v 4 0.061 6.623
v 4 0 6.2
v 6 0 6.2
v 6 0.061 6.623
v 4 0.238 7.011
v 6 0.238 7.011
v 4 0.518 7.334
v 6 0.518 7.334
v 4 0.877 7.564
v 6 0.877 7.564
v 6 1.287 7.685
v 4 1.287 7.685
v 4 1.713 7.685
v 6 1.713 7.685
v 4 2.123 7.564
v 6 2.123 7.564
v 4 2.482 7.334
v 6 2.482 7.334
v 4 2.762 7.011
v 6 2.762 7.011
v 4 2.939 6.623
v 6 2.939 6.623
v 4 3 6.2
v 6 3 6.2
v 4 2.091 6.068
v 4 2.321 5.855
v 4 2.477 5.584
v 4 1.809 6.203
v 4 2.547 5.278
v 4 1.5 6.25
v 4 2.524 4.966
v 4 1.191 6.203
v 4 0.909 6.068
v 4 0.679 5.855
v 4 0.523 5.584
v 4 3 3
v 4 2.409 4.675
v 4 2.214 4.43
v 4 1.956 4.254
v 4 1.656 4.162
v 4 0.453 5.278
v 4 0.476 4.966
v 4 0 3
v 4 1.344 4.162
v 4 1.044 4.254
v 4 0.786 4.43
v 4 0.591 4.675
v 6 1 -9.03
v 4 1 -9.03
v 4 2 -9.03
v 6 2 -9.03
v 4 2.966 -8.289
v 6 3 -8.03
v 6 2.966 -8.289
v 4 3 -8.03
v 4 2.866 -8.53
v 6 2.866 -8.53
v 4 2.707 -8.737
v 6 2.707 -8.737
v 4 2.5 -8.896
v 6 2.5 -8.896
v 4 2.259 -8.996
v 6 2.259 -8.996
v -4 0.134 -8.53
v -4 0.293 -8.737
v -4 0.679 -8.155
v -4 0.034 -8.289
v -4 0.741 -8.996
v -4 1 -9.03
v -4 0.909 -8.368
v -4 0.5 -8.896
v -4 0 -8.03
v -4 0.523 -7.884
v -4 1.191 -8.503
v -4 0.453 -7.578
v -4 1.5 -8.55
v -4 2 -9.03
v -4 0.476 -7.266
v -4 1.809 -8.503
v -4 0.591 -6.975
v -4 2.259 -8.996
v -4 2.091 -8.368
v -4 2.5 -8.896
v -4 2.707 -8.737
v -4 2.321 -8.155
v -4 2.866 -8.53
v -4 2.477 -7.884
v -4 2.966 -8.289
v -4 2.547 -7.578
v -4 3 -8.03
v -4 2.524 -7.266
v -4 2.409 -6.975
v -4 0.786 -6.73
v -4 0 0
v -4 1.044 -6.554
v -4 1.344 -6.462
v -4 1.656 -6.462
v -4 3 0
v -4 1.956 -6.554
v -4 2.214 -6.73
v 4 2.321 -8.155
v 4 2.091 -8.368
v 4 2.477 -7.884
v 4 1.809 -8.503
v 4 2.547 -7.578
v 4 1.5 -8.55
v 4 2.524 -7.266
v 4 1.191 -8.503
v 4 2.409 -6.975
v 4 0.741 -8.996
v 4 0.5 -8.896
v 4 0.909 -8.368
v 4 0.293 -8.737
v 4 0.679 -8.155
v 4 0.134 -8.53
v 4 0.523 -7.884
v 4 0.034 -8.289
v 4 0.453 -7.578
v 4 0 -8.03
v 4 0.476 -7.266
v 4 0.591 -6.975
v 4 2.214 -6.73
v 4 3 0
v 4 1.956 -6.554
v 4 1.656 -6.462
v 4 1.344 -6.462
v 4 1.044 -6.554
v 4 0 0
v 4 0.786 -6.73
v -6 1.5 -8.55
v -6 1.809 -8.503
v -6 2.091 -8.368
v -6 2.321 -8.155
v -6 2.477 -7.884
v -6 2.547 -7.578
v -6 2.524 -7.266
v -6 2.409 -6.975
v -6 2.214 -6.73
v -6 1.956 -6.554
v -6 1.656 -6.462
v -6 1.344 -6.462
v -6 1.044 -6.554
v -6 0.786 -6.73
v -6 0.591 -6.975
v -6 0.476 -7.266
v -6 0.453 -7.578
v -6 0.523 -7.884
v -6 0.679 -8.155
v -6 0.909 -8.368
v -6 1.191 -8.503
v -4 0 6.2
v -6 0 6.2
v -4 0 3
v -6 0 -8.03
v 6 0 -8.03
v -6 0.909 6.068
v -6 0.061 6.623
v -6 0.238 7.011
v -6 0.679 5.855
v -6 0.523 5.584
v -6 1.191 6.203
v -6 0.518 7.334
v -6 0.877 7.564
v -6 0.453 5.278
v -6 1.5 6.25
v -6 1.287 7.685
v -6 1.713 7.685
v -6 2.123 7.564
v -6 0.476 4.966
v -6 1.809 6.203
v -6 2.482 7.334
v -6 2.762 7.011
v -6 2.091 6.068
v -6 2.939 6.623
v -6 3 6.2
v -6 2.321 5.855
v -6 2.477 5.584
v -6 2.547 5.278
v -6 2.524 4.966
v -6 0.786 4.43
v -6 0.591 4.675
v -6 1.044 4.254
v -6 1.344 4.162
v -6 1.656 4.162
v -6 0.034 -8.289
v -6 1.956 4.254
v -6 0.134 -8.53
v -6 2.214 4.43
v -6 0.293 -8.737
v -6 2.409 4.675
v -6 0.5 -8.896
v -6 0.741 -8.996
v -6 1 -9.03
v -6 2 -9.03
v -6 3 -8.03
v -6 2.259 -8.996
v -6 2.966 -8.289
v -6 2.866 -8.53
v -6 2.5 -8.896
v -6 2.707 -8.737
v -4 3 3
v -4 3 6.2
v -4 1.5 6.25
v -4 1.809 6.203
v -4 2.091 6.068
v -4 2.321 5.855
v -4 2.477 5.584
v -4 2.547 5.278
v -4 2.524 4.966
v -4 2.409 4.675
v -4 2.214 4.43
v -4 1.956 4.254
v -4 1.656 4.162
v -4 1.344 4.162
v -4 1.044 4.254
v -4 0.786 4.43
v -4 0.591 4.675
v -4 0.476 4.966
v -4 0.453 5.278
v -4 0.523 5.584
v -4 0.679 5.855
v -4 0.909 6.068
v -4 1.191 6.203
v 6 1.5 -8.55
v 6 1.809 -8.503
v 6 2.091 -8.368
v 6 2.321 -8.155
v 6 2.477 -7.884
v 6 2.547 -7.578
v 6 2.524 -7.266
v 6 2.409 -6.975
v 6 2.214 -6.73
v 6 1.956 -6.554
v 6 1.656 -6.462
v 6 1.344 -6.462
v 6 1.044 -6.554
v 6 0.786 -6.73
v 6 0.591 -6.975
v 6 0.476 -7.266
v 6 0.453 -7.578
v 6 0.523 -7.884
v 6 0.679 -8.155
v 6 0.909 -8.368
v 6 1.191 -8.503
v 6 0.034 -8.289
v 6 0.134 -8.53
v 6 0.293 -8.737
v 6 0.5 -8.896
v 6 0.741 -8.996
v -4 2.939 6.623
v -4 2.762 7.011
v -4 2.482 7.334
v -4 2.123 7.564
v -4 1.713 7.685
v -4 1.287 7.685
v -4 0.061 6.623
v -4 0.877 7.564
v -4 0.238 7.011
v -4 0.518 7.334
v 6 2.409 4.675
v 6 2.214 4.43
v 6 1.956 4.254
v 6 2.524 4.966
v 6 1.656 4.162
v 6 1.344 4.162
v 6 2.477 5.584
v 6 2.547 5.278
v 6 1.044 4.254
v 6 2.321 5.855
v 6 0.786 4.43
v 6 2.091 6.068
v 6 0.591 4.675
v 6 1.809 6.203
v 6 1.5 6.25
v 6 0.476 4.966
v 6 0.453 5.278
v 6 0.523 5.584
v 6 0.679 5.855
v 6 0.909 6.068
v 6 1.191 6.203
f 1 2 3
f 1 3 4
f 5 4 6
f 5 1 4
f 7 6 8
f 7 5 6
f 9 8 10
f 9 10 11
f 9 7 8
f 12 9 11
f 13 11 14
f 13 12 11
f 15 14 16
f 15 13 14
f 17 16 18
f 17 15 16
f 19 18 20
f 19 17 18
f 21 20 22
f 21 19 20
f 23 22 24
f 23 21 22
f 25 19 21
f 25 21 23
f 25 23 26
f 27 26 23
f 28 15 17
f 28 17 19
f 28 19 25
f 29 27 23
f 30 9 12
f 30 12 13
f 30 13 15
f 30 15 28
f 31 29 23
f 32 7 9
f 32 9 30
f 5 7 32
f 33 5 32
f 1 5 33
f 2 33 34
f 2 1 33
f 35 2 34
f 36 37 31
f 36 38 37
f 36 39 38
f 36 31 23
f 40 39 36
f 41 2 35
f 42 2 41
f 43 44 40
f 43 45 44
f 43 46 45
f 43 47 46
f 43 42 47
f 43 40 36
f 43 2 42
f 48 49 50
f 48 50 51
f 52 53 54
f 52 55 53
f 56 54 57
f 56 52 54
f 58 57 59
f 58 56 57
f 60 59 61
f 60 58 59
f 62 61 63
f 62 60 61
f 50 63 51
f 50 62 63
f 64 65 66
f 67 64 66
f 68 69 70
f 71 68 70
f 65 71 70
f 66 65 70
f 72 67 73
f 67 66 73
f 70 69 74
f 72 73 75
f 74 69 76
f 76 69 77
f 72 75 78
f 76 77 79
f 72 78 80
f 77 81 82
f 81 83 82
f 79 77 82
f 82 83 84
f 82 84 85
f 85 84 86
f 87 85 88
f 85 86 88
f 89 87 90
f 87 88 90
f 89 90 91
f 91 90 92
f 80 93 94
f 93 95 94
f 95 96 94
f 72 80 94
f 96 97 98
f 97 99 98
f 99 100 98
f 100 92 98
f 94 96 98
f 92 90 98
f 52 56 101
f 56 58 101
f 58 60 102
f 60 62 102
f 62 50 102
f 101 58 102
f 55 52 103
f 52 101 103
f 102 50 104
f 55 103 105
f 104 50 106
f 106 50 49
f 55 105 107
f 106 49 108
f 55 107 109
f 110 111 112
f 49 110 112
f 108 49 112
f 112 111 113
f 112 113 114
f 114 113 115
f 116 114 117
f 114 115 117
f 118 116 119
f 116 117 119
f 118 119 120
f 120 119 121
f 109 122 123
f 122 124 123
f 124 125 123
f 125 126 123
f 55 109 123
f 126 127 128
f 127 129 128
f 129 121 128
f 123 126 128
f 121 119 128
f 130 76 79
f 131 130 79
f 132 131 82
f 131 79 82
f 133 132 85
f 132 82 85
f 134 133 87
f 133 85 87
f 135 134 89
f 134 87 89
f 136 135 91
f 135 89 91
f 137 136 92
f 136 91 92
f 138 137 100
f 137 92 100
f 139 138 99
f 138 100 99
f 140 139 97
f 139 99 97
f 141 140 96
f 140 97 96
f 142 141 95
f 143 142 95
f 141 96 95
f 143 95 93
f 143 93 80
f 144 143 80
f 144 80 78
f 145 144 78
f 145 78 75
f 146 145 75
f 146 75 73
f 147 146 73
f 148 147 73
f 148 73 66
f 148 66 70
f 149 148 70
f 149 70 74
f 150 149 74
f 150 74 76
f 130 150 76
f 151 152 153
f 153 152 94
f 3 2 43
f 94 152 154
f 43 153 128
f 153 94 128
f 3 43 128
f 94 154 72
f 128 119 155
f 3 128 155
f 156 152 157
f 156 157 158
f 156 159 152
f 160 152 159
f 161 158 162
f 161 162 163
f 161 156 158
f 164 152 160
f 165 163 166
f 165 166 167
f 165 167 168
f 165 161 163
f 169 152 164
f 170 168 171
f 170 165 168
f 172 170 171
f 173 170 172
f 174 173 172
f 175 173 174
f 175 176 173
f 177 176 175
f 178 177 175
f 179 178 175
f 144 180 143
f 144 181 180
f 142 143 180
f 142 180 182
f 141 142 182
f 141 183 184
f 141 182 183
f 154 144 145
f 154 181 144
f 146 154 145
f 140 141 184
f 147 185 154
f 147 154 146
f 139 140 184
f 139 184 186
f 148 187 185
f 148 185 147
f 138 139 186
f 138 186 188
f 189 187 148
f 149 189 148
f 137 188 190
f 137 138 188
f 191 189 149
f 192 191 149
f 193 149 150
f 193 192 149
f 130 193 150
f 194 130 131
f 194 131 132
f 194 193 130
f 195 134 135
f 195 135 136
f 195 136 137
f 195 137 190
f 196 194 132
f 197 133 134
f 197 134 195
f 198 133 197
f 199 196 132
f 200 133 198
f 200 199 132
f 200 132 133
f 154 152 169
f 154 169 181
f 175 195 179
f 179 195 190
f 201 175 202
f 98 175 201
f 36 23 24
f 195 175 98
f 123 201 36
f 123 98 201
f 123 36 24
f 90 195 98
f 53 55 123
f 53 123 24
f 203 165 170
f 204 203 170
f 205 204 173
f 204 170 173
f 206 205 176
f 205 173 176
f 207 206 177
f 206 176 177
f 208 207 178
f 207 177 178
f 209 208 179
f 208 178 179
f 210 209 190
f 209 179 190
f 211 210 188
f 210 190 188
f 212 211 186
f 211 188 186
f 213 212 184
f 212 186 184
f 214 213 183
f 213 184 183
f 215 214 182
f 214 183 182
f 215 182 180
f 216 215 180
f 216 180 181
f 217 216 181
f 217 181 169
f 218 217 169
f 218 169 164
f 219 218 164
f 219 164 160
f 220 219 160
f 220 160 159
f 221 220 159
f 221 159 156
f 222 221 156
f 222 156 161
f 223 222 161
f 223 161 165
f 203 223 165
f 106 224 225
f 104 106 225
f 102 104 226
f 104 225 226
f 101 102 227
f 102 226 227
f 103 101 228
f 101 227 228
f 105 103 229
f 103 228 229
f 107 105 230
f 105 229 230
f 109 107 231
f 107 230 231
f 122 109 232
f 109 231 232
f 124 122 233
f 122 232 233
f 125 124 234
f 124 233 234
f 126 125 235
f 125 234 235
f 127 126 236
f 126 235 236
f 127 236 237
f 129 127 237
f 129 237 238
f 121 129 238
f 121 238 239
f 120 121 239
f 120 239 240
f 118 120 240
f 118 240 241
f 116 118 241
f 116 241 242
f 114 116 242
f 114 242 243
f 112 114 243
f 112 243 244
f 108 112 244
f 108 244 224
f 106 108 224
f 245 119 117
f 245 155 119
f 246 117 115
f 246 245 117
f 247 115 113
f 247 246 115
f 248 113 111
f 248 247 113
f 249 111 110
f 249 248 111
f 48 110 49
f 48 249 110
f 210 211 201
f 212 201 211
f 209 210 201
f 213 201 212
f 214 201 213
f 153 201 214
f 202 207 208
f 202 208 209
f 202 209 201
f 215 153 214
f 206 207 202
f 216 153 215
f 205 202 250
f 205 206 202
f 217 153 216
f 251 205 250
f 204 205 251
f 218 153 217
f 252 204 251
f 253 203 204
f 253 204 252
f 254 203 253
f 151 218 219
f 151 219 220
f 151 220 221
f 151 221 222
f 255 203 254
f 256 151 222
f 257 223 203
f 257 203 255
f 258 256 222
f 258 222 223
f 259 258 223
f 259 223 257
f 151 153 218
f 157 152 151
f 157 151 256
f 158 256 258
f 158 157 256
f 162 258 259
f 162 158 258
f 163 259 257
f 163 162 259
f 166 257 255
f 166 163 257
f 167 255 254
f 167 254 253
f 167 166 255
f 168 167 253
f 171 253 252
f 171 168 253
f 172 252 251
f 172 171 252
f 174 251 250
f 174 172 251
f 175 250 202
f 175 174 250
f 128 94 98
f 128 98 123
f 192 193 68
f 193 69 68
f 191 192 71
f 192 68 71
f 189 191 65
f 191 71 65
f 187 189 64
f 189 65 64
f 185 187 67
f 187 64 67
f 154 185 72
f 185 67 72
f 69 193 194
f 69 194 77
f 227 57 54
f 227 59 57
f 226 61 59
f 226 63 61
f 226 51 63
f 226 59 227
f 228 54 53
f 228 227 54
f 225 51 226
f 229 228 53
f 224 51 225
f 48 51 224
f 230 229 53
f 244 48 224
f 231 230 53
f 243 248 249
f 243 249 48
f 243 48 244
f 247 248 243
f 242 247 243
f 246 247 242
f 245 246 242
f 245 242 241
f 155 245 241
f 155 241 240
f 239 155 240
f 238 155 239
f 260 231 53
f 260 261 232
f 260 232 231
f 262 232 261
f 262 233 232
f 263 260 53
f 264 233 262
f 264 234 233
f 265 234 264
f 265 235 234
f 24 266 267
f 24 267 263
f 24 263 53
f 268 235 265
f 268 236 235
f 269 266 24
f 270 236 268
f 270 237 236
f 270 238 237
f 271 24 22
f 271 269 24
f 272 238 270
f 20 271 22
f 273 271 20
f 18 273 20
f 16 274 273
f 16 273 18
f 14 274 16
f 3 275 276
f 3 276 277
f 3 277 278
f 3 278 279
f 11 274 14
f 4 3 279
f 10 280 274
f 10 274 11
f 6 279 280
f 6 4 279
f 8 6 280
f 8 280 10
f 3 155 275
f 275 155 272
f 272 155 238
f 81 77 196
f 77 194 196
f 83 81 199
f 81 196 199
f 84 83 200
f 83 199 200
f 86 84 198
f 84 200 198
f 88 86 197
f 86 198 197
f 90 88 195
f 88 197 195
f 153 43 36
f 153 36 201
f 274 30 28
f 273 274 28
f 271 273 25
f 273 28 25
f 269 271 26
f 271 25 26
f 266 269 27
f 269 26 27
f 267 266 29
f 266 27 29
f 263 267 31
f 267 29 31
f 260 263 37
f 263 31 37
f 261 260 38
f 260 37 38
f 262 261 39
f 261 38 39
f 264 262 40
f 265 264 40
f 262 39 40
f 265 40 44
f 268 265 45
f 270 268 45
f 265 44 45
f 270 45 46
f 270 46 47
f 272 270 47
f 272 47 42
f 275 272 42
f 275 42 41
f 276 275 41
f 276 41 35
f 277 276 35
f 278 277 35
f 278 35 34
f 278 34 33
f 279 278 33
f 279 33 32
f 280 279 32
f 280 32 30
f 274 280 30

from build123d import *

# Parameters (mm, degrees)
EXTRUDE_1_DEPTH     = 3
SKETCH_2_OUTSIDE_W  = 13.724
SKETCH_2_OUTSIDE_H  = 8.024
CUT_EXTRUDE_1_DEPTH = 12
SKETCH_3_R          = 1.05
CUT_EXTRUDE_2_DEPTH = 12
FILLET_1_R          = 1
SKETCH_4_R          = 0.95
EXTRUDE_2_DEPTH     = 4
SKETCH_5_W          = 12
SKETCH_5_H          = 3
EXTRUDE_3_DEPTH     = 8
SKETCH_6_R          = 1.05
CUT_EXTRUDE_3_DEPTH = 12
CUT_EXTRUDE_4_DEPTH = 14.747727085
FILLET_2_R          = 1
SKETCH_9_W          = 11.8
SKETCH_9_H          = 3
EXTRUDE_4_DEPTH     = 4
SKETCH_10_W         = 8
SKETCH_10_H         = 4
CUT_EXTRUDE_5_DEPTH = 10
SKETCH_12_W         = 12
SKETCH_12_H         = 3
EXTRUDE_5_DEPTH     = 2
FILLET_3_R          = 1
SKETCH_13_W         = 12
SKETCH_13_H         = 2.969780185
CUT_EXTRUDE_6_DEPTH = 14.747727085
FILLET_4_R          = 1
SKETCH_15_W         = 8
SKETCH_15_H         = 4
CUT_EXTRUDE_7_DEPTH = 12.249216413
SKETCH_16_W         = 2
SKETCH_16_H         = 4.595961916
EXTRUDE_6_DEPTH     = 3


with BuildPart() as part:
    # 草图1 → 凸台-拉伸1 (new body)
    with BuildSketch(Plane(origin=(0, 0, 0), x_dir=(1, 0, 0), z_dir=(0, 1, 0))):
        Polygon((-6, 0), (6, 0), (6, -8.7), (4, -8.7), (4, -3), (-4, -3), (-4, -8.7), (-6, -8.7), align=None)
    extrude(amount=EXTRUDE_1_DEPTH)

    # 草图2 outside → 切除-拉伸1 (cut)
    with BuildSketch(Plane.ZY.offset(6)):
        with Locations((4.35, 1.5)):
            Rectangle(SKETCH_2_OUTSIDE_W, SKETCH_2_OUTSIDE_H)
        with BuildLine():
            Line((6.2, 3), (0, 3))
            Line((0, 3), (0, 0))
            Line((0, 0), (6.2, 0))
            ThreePointArc((6.2, 0), (7.7, 1.5), (6.2, 3))
        make_face(mode=Mode.SUBTRACT)
    extrude(amount=-CUT_EXTRUDE_1_DEPTH, mode=Mode.SUBTRACT)

    # 草图3 → 切除-拉伸2 (cut)
    with BuildSketch(Plane.ZY.offset(6)):
        with Locations((5.2, 1.5)):
            Circle(SKETCH_3_R)
    extrude(amount=-CUT_EXTRUDE_2_DEPTH, mode=Mode.SUBTRACT)

    # 圆角1
    fillet_1_edges = [part.edges().sort_by_distance(p)[0] for p in [
        (-6, 1.5, 0),
        (6, 1.5, 0),
    ]]
    fillet(fillet_1_edges, radius=FILLET_1_R)

    # 草图4 → 凸台-拉伸2 (add)
    with BuildSketch(Plane(origin=(0, 0, 0), x_dir=(-1, 0, 0), z_dir=(0, 0, -1))):
        with Locations(Location((0, 1.5, 0), (0, 0, 180))):
            Circle(SKETCH_4_R)
    extrude(amount=EXTRUDE_2_DEPTH)

    # 草图5 → 凸台-拉伸3 (add)
    with BuildSketch(Plane(origin=(0, 0, -4), x_dir=(-1, 0, 0), z_dir=(0, 0, -1))):
        with Locations((0, 1.5)):
            Rectangle(SKETCH_5_W, SKETCH_5_H)
    extrude(amount=EXTRUDE_3_DEPTH)

    # 草图6 → 切除-拉伸3 (cut)
    with BuildSketch(Plane(origin=(6, 0, 0), x_dir=(0, 0, -1), z_dir=(1, 0, 0))):
        with Locations((7.5, 1.5)):
            Circle(SKETCH_6_R)
    extrude(amount=-CUT_EXTRUDE_3_DEPTH, mode=Mode.SUBTRACT)

    # 草图8 → 切除-拉伸4 (cut, through all)
    with BuildSketch(Plane(origin=(0, 3, 0), x_dir=(1, 0, 0), z_dir=(0, 1, 0))):
        Polygon((-1.5, 8), (1.5, 8), (4, 8), (4, 12), (1.5, 12), (-1.5, 12), (-4, 12), (-4, 8), align=None)
    extrude(amount=-CUT_EXTRUDE_4_DEPTH, mode=Mode.SUBTRACT)

    # 圆角2
    fillet_2_edges = [part.edges().sort_by_distance(p)[0] for p in [
        (-5, 0, -12),
        (5, 0, -12),
    ]]
    fillet(fillet_2_edges, radius=FILLET_2_R)

    # 草图9 → 凸台-拉伸4 (add)
    with BuildSketch(Plane.XY.offset(-4)):
        with Locations((0, 1.5)):
            Rectangle(SKETCH_9_W, SKETCH_9_H)
    extrude(amount=EXTRUDE_4_DEPTH)

    # 草图10 → 切除-拉伸5 (cut)
    with BuildSketch(Plane(origin=(0, 3, 0), x_dir=(1, 0, 0), z_dir=(0, 1, 0))):
        with Locations((0, 6)):
            Rectangle(SKETCH_10_W, SKETCH_10_H)
    extrude(amount=-CUT_EXTRUDE_5_DEPTH, mode=Mode.SUBTRACT)

    # 草图12 → 凸台-拉伸5 (add)
    with BuildSketch(Plane.XY.offset(-4)):
        with Locations((0, 1.5)):
            Rectangle(SKETCH_12_W, SKETCH_12_H)
    extrude(amount=EXTRUDE_5_DEPTH)

    # 圆角3
    # the kernel refuses this fillet: 1 mm, written as the material it takes off along each edge
    with BuildSketch(Plane(origin=(6, 4.089724736, -2), x_dir=(0, 0, -1), z_dir=(0, -1, 0)), Plane(origin=(-6, -1.089724736, -2), x_dir=(0, 0, -1), z_dir=(0, 1, 0))) as fillet_3_piece_1:
        with BuildLine():
            CenterArc((0.435889894, -1), FILLET_3_R, 90, 25.841932763)
            Line((0, -0.1), (-0.008717798, -0.082))
            ThreePointArc((-0.008717798, -0.082), (-0.02, -0.05), (-0.02, 0))
            Line((-0.02, 0), (0, 0.02))
            Line((0, 0.02), (0.435889894, 0.02))
            Line((0.435889894, 0.02), (0.435889894, 0))
        make_face()
    extrude(amount=5.179449472, mode=Mode.SUBTRACT)

    # 草图13 → 切除-拉伸6 (cut, through all)
    with BuildSketch(Plane.XZ):
        with Locations((0, -10.515109908)):
            Rectangle(SKETCH_13_W, SKETCH_13_H)
    extrude(amount=-CUT_EXTRUDE_6_DEPTH, mode=Mode.SUBTRACT)

    # 圆角4
    fillet_4_edges = [part.edges().sort_by_distance(p)[0] for p in [
        (5, 3, -9.030219815),
        (-5, 3, -9.030219815),
        (5, 0, -9.030219815),
        (-5, 0, -9.030219815),
    ]]
    fillet(fillet_4_edges, radius=FILLET_4_R)

    # 草图15 → 切除-拉伸7 (cut, through all)
    with BuildSketch(Plane.XZ):
        with Locations((0, -2)):
            Rectangle(SKETCH_15_W, SKETCH_15_H)
    extrude(amount=-CUT_EXTRUDE_7_DEPTH, mode=Mode.SUBTRACT)

    # 草图16 → 凸台-拉伸6 (add, through all)
    with BuildSketch(Plane.XZ):
        with Locations((-5, -0.242379669)):
            Rectangle(SKETCH_16_W, SKETCH_16_H)
        with Locations((5, -0.242379669)):
            Rectangle(SKETCH_16_W, SKETCH_16_H)
    extrude(amount=-EXTRUDE_6_DEPTH)


solid = part.part
